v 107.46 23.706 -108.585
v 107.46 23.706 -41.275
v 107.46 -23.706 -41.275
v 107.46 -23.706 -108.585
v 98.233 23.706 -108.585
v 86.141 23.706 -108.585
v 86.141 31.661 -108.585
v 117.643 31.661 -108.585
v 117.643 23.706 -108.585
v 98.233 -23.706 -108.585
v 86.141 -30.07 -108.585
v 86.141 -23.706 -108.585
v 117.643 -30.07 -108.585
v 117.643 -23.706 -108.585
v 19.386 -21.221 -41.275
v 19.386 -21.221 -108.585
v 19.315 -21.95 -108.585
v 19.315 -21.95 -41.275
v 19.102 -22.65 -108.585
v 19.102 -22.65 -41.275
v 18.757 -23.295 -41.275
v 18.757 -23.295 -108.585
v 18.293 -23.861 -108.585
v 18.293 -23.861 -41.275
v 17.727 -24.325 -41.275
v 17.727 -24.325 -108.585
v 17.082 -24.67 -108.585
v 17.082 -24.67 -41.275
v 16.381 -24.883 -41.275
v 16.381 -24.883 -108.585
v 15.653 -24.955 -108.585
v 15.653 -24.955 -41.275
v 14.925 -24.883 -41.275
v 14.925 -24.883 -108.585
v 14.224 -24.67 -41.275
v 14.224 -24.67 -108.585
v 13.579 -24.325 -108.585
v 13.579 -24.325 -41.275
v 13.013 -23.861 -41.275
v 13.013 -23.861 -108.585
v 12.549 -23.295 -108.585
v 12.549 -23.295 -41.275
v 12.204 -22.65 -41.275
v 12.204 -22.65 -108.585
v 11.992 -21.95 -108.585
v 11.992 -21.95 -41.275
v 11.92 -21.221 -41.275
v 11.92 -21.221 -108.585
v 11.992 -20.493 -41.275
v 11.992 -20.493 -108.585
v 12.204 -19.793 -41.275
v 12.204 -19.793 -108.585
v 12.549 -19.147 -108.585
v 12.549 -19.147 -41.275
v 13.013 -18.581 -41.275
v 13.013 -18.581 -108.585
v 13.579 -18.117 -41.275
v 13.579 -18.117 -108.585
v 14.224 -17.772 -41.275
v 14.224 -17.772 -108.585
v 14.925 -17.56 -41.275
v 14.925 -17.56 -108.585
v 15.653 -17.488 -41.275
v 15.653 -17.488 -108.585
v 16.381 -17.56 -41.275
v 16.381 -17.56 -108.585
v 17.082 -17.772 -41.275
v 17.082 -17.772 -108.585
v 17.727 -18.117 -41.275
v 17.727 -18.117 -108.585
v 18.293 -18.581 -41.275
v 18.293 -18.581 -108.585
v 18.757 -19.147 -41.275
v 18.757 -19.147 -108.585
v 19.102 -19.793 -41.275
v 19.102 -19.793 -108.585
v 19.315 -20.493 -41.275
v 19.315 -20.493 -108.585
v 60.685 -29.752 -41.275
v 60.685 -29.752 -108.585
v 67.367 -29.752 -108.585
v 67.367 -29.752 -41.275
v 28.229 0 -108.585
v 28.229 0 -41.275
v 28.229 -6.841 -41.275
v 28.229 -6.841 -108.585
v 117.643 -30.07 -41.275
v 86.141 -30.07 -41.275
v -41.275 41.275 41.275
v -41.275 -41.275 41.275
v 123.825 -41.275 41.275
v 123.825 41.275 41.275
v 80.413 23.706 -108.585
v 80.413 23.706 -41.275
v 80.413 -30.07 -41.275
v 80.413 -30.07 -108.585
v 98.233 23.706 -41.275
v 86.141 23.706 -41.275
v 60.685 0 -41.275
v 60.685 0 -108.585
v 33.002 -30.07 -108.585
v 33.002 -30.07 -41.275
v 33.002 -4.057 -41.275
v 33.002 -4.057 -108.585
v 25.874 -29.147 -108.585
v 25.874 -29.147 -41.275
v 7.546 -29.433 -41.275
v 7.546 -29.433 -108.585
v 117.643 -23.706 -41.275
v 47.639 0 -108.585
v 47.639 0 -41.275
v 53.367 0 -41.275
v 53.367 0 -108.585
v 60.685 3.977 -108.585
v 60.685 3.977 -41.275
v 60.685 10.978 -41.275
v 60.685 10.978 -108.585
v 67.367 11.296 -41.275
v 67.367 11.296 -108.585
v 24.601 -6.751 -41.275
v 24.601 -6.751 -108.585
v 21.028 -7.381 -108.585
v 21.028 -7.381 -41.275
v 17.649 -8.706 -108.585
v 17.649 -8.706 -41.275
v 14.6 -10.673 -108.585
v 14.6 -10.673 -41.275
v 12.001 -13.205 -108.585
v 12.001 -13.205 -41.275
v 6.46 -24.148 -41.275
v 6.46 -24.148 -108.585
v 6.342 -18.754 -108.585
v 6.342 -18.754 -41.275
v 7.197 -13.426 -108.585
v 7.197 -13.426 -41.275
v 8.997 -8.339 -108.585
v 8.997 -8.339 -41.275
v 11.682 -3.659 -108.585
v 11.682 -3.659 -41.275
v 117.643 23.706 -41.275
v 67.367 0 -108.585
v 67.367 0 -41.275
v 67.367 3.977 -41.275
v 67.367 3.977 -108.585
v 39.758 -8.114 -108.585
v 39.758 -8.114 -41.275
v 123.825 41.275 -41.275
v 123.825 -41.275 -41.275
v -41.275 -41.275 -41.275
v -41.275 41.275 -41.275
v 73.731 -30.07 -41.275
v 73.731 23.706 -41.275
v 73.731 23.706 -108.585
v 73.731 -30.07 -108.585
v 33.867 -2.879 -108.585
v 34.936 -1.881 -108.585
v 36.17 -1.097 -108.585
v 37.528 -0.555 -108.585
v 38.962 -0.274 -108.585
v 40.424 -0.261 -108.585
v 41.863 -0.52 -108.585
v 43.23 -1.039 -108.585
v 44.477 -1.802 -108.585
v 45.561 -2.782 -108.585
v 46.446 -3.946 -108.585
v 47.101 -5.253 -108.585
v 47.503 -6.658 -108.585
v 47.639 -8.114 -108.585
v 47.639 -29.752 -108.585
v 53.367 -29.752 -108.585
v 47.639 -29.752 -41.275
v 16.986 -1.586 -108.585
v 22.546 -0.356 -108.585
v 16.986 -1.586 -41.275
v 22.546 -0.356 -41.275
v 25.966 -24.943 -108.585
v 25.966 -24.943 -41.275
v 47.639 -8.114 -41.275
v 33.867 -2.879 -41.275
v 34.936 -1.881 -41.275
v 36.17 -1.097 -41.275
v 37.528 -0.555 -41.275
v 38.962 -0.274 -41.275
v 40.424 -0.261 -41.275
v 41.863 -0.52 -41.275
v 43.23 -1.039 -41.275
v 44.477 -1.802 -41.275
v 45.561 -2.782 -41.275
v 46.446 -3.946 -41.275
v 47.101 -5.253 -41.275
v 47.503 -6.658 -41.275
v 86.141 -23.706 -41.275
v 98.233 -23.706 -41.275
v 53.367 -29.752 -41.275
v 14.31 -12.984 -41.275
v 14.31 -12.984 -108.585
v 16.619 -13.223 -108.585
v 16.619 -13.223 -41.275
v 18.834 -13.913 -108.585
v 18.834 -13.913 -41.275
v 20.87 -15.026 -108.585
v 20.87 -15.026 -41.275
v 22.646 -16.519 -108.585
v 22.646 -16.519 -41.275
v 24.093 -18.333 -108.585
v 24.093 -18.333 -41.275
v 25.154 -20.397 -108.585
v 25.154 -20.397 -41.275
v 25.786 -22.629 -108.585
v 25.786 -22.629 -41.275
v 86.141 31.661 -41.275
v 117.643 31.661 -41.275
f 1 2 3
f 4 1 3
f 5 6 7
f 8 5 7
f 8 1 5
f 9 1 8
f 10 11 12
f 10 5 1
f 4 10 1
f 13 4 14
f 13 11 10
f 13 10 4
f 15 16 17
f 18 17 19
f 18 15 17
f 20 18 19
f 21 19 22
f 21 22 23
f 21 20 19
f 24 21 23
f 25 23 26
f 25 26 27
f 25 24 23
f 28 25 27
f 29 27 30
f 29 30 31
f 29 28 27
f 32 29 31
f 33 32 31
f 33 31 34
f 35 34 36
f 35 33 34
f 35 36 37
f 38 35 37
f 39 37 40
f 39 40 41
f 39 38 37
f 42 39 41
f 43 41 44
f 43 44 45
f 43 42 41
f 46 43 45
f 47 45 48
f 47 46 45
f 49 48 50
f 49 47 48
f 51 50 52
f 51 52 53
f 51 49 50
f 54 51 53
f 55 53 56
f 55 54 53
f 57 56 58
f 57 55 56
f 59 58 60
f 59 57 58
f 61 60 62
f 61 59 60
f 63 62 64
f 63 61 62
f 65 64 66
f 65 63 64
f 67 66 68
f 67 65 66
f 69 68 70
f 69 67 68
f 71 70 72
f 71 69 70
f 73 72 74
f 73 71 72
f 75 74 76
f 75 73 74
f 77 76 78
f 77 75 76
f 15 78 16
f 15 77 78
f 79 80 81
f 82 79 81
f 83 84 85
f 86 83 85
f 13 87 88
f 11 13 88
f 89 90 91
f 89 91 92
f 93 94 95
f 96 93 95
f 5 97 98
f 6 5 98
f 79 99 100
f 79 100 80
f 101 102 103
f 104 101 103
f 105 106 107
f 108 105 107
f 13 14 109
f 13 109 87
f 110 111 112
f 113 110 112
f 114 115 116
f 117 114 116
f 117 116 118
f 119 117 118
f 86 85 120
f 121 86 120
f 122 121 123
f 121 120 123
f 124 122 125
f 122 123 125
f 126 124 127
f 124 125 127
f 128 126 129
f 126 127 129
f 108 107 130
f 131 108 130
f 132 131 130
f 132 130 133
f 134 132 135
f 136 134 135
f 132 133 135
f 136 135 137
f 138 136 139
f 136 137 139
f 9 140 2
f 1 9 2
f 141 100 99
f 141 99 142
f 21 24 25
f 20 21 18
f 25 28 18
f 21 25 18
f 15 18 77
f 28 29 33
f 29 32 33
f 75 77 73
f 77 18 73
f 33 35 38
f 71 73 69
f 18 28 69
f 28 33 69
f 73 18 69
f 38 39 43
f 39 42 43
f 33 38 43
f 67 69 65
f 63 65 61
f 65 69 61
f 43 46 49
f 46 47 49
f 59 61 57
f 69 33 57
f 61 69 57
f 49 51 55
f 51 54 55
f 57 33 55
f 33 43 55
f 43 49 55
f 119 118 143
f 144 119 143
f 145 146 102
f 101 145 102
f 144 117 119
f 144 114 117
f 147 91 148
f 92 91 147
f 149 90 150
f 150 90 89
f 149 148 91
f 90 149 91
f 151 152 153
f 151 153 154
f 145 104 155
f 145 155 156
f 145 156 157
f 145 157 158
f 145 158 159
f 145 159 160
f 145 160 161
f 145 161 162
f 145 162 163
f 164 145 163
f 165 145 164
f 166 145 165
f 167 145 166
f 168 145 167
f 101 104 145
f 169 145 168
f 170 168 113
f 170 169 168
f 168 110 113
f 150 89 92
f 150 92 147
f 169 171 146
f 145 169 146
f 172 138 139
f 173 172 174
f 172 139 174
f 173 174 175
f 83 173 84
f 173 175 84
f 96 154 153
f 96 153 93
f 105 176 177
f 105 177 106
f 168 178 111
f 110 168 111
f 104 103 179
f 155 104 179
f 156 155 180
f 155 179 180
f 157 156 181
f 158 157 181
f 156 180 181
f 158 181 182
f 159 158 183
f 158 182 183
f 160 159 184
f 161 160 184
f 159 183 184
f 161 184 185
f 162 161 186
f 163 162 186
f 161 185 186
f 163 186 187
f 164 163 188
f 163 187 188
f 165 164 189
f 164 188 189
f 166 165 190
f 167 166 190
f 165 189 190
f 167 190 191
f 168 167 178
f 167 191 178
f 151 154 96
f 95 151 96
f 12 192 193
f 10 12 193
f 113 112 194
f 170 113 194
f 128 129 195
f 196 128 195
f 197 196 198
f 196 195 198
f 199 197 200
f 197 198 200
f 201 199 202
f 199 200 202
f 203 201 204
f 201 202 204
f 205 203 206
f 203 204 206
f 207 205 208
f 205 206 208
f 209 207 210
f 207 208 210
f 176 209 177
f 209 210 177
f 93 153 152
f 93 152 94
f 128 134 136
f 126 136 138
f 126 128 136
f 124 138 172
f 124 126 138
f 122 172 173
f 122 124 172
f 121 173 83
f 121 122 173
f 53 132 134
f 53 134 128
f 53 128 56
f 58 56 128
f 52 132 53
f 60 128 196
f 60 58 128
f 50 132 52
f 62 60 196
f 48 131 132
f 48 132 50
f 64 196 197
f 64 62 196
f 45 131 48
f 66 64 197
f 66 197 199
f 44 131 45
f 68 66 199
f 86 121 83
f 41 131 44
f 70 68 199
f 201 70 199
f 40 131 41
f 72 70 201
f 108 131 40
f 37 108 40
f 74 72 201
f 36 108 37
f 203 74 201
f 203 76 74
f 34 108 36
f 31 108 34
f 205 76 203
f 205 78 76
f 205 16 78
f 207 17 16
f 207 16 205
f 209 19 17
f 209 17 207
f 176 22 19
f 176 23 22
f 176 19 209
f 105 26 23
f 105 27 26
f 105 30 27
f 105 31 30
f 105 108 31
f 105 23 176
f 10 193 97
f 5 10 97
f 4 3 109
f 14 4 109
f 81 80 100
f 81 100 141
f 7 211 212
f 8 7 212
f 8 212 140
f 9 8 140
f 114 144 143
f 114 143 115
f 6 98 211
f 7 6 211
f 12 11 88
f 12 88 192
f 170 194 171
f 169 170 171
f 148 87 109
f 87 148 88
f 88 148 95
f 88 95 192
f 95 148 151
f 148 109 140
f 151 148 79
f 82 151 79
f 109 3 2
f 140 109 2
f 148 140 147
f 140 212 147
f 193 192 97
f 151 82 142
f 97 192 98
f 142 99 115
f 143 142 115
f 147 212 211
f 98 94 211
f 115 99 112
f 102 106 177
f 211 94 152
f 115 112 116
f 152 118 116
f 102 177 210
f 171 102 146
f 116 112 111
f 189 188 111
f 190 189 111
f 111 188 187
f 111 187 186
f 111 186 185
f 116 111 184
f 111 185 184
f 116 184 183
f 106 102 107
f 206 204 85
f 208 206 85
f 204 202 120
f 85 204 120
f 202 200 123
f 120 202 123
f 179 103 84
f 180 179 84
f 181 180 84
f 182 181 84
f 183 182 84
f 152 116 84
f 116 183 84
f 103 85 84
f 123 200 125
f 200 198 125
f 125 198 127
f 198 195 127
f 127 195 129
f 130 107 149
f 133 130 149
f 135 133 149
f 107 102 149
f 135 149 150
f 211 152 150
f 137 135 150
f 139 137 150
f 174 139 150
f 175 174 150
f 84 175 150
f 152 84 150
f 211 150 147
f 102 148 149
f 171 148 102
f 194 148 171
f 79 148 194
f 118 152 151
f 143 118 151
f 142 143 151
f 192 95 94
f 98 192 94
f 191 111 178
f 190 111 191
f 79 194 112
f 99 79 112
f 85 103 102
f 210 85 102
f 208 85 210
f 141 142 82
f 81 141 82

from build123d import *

# Parameters (mm, degrees)
F1_W     = 82.55
F1_H     = 82.55
F2_DEPTH = 41.275
F3_DEPTH = 82.55
F4_W     = 6.6821798682
F4_H     = 53.7756439298
F4_H_2   = 29.7516137362
F4_R     = 3.7333162537
F5_DEPTH = 67.31


# Not quite as in the source:
# - a variable given as a bare number and used for a length is read in inches; the dataset says mm whatever the document's units were


with BuildPart() as f2:
    # F1 (on Top) → F2 (new body, symmetric)
    with BuildSketch(Plane.XY):
        Rectangle(F1_W, F1_H)
    extrude(amount=F2_DEPTH, both=True)

    # F3 (add): a face of the model
    f3_faces = [f2.faces().sort_by_distance(p)[0] for p in [
        (41.275, 0, 0),
    ]]
    extrude(f3_faces, amount=F3_DEPTH)

    # F4 (on face) → F5 (join)
    with BuildSketch(Plane(origin=(0, 0, -41.275), x_dir=(1, 0, 0), z_dir=(0, 0, -1))):
        Polygon((117.642775178, -23.7058307976), (107.4604094028, -23.7058307976), (107.4604094028, 23.7058326602), (117.642775178, 23.7058326602), (117.642775178, 30.0698131323), (86.1410722136, 30.0698131323), (86.1410722136, 23.7058326602), (98.2326343656, 23.7058326602), (98.2326343656, -23.7058307976), (86.1410722136, -23.7058307976), (86.1410722136, -31.6608063877), (117.642775178, -31.6608063877), align=None)
        with Locations((77.0723931491, 3.1819911674)):
            Rectangle(F4_W, F4_H)
        with Locations((64.0262328088, 14.8758068681)):
            Rectangle(F4_W, F4_H_2)
        Polygon((60.6851428747, -10.9778670594), (67.3673227429, -11.2960664555), (67.3673227429, -3.9774877951), (60.6851428747, -3.9774877951), align=None)
        with BuildLine():
            Line((47.6389825344, 0), (53.3665642142, 0))
            Line((53.3665642142, 0), (53.3665642142, 29.7516137362))
            Line((53.3665642142, 29.7516137362), (47.6389825344, 29.7516137362))
            Line((47.6389825344, 29.7516137362), (39.7581494696, 8.1140771508))
            Line((39.7581494696, 8.1140771508), (33.0018214881, 30.0698131323))
            Line((33.0018214881, 30.0698131323), (33.0018214881, 4.0570385754))
            ThreePointArc((33.0018214881, 4.0570385754), (41.8631479069, 0.5195718098), (47.6389825344, 8.1140771508))
            Line((47.6389825344, 8.1140771508), (47.6389825344, 0))
        make_face()
        with BuildLine():
            ThreePointArc((7.5458958745, 29.43341434), (6.649165746, 16.0704833991), (11.6824880242, 3.6592902616))
            ThreePointArc((11.6824880242, 3.6592902616), (19.7418824044, 0.862989669), (28.2288361341, 0))
            Line((28.2288361341, 0), (28.2288361341, 6.8412809633))
            ThreePointArc((28.2288361341, 6.8412809633), (19.3054549337, 7.9595465035), (12.0006818324, 13.2052628323))
            ThreePointArc((12.0006818324, 13.2052628323), (21.7952321918, 15.7282111285), (25.9655225304, 24.9427194354))
            Line((25.9655225304, 24.9427194354), (25.8736382976, 29.1471914205))
            Line((25.8736382976, 29.1471914205), (7.5458958745, 29.43341434))
        make_face()
        with Locations((15.6531465528, 21.2212410615)):
            Circle(F4_R, mode=Mode.SUBTRACT)
    extrude(amount=F5_DEPTH)


solid = f2.part
